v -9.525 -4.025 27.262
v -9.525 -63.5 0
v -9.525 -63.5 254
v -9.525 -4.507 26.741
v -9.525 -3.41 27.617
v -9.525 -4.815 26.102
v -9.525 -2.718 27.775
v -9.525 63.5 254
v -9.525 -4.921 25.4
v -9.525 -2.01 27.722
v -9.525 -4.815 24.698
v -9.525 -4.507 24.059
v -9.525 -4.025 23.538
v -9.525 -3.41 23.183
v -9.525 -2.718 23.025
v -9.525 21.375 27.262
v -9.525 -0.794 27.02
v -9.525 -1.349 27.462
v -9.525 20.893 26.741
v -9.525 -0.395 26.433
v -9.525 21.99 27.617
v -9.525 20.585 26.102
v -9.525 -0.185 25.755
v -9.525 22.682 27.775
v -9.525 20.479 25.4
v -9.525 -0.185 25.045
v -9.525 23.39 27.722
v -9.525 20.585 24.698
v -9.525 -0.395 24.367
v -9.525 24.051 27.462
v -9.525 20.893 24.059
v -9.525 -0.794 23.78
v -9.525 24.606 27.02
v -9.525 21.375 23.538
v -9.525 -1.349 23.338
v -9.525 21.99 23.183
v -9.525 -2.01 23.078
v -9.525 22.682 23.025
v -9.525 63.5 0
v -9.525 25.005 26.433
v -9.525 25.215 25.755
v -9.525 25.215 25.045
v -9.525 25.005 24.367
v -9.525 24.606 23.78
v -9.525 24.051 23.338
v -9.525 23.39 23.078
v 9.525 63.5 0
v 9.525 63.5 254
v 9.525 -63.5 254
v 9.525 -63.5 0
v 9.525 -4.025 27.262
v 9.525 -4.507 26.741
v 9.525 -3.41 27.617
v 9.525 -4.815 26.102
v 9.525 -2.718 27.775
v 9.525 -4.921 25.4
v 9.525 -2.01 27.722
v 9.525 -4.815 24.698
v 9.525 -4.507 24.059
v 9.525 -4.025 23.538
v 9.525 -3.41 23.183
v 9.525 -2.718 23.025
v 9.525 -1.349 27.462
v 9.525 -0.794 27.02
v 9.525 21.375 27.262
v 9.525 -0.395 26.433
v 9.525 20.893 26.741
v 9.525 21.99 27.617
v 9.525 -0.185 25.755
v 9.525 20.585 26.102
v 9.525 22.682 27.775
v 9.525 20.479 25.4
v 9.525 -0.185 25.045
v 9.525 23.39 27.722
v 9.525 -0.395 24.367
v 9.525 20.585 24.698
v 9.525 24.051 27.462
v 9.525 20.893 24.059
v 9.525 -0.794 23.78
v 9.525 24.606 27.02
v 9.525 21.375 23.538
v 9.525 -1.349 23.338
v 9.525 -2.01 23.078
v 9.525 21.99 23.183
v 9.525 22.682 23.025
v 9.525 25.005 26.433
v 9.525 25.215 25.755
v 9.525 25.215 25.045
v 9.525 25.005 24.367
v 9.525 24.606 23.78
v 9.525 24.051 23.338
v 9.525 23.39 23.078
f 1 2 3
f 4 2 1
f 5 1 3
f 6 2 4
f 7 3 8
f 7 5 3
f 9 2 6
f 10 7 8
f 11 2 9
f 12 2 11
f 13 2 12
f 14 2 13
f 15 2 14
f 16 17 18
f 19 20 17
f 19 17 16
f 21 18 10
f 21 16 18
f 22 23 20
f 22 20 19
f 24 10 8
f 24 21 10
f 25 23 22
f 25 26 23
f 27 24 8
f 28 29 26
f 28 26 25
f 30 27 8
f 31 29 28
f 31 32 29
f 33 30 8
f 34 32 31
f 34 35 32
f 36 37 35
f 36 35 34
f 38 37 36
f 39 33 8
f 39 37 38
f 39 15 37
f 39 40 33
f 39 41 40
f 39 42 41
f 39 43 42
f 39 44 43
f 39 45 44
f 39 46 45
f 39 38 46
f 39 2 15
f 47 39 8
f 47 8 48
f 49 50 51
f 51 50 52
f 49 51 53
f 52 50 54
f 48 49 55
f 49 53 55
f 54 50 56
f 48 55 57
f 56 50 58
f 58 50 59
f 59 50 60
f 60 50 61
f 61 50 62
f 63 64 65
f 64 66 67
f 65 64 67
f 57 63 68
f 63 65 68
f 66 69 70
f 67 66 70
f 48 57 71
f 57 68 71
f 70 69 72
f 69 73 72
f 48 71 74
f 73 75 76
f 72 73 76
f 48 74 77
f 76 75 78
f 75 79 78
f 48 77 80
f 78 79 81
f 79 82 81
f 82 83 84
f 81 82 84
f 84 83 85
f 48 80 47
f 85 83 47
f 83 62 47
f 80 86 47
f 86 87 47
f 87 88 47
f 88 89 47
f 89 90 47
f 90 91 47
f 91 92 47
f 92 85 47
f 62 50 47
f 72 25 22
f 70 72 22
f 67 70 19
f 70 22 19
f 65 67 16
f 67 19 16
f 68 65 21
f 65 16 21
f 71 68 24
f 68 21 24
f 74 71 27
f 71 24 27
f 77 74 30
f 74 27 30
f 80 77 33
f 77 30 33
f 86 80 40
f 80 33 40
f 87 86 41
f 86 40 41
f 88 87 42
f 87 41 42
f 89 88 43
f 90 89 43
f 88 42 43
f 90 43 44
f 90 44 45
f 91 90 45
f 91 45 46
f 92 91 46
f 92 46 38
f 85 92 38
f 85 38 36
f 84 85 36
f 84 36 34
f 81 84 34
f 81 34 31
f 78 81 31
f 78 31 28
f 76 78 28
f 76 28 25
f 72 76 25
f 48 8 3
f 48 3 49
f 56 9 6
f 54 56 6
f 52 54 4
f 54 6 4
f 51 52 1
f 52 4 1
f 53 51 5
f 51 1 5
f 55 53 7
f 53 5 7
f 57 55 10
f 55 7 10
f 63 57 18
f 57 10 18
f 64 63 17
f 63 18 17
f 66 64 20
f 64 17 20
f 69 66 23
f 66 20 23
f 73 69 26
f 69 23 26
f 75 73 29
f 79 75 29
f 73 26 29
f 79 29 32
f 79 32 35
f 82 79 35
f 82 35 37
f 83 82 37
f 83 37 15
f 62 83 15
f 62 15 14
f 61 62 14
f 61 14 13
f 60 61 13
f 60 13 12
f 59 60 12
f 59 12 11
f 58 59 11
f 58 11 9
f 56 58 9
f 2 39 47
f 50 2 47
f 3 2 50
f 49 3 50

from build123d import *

# Parameters (mm, degrees)
SKETCH1_W           = 19.05
SKETCH1_H           = 127
BOSS_EXTRUDE1_DEPTH = 254
SKETCH2_R           = 2.38125
CUT_EXTRUDE1_DEPTH  = 263.509337929


with BuildPart() as part:
    # Sketch1 → Boss-Extrude1 (new body)
    with BuildSketch(Plane.XY):
        Rectangle(SKETCH1_W, SKETCH1_H)
    extrude(amount=BOSS_EXTRUDE1_DEPTH)

    # Sketch2 → Cut-Extrude1 (cut, through all)
    with BuildSketch(Plane.ZY.offset(9.525)):
        with Locations(Location((25.4, 22.86, 0), (0, 0, 270))):
            Circle(SKETCH2_R)
        with Locations(Location((25.4, -2.54, 0), (0, 0, 270))):
            Circle(SKETCH2_R)
    extrude(amount=-CUT_EXTRUDE1_DEPTH, mode=Mode.SUBTRACT)


solid = part.part
